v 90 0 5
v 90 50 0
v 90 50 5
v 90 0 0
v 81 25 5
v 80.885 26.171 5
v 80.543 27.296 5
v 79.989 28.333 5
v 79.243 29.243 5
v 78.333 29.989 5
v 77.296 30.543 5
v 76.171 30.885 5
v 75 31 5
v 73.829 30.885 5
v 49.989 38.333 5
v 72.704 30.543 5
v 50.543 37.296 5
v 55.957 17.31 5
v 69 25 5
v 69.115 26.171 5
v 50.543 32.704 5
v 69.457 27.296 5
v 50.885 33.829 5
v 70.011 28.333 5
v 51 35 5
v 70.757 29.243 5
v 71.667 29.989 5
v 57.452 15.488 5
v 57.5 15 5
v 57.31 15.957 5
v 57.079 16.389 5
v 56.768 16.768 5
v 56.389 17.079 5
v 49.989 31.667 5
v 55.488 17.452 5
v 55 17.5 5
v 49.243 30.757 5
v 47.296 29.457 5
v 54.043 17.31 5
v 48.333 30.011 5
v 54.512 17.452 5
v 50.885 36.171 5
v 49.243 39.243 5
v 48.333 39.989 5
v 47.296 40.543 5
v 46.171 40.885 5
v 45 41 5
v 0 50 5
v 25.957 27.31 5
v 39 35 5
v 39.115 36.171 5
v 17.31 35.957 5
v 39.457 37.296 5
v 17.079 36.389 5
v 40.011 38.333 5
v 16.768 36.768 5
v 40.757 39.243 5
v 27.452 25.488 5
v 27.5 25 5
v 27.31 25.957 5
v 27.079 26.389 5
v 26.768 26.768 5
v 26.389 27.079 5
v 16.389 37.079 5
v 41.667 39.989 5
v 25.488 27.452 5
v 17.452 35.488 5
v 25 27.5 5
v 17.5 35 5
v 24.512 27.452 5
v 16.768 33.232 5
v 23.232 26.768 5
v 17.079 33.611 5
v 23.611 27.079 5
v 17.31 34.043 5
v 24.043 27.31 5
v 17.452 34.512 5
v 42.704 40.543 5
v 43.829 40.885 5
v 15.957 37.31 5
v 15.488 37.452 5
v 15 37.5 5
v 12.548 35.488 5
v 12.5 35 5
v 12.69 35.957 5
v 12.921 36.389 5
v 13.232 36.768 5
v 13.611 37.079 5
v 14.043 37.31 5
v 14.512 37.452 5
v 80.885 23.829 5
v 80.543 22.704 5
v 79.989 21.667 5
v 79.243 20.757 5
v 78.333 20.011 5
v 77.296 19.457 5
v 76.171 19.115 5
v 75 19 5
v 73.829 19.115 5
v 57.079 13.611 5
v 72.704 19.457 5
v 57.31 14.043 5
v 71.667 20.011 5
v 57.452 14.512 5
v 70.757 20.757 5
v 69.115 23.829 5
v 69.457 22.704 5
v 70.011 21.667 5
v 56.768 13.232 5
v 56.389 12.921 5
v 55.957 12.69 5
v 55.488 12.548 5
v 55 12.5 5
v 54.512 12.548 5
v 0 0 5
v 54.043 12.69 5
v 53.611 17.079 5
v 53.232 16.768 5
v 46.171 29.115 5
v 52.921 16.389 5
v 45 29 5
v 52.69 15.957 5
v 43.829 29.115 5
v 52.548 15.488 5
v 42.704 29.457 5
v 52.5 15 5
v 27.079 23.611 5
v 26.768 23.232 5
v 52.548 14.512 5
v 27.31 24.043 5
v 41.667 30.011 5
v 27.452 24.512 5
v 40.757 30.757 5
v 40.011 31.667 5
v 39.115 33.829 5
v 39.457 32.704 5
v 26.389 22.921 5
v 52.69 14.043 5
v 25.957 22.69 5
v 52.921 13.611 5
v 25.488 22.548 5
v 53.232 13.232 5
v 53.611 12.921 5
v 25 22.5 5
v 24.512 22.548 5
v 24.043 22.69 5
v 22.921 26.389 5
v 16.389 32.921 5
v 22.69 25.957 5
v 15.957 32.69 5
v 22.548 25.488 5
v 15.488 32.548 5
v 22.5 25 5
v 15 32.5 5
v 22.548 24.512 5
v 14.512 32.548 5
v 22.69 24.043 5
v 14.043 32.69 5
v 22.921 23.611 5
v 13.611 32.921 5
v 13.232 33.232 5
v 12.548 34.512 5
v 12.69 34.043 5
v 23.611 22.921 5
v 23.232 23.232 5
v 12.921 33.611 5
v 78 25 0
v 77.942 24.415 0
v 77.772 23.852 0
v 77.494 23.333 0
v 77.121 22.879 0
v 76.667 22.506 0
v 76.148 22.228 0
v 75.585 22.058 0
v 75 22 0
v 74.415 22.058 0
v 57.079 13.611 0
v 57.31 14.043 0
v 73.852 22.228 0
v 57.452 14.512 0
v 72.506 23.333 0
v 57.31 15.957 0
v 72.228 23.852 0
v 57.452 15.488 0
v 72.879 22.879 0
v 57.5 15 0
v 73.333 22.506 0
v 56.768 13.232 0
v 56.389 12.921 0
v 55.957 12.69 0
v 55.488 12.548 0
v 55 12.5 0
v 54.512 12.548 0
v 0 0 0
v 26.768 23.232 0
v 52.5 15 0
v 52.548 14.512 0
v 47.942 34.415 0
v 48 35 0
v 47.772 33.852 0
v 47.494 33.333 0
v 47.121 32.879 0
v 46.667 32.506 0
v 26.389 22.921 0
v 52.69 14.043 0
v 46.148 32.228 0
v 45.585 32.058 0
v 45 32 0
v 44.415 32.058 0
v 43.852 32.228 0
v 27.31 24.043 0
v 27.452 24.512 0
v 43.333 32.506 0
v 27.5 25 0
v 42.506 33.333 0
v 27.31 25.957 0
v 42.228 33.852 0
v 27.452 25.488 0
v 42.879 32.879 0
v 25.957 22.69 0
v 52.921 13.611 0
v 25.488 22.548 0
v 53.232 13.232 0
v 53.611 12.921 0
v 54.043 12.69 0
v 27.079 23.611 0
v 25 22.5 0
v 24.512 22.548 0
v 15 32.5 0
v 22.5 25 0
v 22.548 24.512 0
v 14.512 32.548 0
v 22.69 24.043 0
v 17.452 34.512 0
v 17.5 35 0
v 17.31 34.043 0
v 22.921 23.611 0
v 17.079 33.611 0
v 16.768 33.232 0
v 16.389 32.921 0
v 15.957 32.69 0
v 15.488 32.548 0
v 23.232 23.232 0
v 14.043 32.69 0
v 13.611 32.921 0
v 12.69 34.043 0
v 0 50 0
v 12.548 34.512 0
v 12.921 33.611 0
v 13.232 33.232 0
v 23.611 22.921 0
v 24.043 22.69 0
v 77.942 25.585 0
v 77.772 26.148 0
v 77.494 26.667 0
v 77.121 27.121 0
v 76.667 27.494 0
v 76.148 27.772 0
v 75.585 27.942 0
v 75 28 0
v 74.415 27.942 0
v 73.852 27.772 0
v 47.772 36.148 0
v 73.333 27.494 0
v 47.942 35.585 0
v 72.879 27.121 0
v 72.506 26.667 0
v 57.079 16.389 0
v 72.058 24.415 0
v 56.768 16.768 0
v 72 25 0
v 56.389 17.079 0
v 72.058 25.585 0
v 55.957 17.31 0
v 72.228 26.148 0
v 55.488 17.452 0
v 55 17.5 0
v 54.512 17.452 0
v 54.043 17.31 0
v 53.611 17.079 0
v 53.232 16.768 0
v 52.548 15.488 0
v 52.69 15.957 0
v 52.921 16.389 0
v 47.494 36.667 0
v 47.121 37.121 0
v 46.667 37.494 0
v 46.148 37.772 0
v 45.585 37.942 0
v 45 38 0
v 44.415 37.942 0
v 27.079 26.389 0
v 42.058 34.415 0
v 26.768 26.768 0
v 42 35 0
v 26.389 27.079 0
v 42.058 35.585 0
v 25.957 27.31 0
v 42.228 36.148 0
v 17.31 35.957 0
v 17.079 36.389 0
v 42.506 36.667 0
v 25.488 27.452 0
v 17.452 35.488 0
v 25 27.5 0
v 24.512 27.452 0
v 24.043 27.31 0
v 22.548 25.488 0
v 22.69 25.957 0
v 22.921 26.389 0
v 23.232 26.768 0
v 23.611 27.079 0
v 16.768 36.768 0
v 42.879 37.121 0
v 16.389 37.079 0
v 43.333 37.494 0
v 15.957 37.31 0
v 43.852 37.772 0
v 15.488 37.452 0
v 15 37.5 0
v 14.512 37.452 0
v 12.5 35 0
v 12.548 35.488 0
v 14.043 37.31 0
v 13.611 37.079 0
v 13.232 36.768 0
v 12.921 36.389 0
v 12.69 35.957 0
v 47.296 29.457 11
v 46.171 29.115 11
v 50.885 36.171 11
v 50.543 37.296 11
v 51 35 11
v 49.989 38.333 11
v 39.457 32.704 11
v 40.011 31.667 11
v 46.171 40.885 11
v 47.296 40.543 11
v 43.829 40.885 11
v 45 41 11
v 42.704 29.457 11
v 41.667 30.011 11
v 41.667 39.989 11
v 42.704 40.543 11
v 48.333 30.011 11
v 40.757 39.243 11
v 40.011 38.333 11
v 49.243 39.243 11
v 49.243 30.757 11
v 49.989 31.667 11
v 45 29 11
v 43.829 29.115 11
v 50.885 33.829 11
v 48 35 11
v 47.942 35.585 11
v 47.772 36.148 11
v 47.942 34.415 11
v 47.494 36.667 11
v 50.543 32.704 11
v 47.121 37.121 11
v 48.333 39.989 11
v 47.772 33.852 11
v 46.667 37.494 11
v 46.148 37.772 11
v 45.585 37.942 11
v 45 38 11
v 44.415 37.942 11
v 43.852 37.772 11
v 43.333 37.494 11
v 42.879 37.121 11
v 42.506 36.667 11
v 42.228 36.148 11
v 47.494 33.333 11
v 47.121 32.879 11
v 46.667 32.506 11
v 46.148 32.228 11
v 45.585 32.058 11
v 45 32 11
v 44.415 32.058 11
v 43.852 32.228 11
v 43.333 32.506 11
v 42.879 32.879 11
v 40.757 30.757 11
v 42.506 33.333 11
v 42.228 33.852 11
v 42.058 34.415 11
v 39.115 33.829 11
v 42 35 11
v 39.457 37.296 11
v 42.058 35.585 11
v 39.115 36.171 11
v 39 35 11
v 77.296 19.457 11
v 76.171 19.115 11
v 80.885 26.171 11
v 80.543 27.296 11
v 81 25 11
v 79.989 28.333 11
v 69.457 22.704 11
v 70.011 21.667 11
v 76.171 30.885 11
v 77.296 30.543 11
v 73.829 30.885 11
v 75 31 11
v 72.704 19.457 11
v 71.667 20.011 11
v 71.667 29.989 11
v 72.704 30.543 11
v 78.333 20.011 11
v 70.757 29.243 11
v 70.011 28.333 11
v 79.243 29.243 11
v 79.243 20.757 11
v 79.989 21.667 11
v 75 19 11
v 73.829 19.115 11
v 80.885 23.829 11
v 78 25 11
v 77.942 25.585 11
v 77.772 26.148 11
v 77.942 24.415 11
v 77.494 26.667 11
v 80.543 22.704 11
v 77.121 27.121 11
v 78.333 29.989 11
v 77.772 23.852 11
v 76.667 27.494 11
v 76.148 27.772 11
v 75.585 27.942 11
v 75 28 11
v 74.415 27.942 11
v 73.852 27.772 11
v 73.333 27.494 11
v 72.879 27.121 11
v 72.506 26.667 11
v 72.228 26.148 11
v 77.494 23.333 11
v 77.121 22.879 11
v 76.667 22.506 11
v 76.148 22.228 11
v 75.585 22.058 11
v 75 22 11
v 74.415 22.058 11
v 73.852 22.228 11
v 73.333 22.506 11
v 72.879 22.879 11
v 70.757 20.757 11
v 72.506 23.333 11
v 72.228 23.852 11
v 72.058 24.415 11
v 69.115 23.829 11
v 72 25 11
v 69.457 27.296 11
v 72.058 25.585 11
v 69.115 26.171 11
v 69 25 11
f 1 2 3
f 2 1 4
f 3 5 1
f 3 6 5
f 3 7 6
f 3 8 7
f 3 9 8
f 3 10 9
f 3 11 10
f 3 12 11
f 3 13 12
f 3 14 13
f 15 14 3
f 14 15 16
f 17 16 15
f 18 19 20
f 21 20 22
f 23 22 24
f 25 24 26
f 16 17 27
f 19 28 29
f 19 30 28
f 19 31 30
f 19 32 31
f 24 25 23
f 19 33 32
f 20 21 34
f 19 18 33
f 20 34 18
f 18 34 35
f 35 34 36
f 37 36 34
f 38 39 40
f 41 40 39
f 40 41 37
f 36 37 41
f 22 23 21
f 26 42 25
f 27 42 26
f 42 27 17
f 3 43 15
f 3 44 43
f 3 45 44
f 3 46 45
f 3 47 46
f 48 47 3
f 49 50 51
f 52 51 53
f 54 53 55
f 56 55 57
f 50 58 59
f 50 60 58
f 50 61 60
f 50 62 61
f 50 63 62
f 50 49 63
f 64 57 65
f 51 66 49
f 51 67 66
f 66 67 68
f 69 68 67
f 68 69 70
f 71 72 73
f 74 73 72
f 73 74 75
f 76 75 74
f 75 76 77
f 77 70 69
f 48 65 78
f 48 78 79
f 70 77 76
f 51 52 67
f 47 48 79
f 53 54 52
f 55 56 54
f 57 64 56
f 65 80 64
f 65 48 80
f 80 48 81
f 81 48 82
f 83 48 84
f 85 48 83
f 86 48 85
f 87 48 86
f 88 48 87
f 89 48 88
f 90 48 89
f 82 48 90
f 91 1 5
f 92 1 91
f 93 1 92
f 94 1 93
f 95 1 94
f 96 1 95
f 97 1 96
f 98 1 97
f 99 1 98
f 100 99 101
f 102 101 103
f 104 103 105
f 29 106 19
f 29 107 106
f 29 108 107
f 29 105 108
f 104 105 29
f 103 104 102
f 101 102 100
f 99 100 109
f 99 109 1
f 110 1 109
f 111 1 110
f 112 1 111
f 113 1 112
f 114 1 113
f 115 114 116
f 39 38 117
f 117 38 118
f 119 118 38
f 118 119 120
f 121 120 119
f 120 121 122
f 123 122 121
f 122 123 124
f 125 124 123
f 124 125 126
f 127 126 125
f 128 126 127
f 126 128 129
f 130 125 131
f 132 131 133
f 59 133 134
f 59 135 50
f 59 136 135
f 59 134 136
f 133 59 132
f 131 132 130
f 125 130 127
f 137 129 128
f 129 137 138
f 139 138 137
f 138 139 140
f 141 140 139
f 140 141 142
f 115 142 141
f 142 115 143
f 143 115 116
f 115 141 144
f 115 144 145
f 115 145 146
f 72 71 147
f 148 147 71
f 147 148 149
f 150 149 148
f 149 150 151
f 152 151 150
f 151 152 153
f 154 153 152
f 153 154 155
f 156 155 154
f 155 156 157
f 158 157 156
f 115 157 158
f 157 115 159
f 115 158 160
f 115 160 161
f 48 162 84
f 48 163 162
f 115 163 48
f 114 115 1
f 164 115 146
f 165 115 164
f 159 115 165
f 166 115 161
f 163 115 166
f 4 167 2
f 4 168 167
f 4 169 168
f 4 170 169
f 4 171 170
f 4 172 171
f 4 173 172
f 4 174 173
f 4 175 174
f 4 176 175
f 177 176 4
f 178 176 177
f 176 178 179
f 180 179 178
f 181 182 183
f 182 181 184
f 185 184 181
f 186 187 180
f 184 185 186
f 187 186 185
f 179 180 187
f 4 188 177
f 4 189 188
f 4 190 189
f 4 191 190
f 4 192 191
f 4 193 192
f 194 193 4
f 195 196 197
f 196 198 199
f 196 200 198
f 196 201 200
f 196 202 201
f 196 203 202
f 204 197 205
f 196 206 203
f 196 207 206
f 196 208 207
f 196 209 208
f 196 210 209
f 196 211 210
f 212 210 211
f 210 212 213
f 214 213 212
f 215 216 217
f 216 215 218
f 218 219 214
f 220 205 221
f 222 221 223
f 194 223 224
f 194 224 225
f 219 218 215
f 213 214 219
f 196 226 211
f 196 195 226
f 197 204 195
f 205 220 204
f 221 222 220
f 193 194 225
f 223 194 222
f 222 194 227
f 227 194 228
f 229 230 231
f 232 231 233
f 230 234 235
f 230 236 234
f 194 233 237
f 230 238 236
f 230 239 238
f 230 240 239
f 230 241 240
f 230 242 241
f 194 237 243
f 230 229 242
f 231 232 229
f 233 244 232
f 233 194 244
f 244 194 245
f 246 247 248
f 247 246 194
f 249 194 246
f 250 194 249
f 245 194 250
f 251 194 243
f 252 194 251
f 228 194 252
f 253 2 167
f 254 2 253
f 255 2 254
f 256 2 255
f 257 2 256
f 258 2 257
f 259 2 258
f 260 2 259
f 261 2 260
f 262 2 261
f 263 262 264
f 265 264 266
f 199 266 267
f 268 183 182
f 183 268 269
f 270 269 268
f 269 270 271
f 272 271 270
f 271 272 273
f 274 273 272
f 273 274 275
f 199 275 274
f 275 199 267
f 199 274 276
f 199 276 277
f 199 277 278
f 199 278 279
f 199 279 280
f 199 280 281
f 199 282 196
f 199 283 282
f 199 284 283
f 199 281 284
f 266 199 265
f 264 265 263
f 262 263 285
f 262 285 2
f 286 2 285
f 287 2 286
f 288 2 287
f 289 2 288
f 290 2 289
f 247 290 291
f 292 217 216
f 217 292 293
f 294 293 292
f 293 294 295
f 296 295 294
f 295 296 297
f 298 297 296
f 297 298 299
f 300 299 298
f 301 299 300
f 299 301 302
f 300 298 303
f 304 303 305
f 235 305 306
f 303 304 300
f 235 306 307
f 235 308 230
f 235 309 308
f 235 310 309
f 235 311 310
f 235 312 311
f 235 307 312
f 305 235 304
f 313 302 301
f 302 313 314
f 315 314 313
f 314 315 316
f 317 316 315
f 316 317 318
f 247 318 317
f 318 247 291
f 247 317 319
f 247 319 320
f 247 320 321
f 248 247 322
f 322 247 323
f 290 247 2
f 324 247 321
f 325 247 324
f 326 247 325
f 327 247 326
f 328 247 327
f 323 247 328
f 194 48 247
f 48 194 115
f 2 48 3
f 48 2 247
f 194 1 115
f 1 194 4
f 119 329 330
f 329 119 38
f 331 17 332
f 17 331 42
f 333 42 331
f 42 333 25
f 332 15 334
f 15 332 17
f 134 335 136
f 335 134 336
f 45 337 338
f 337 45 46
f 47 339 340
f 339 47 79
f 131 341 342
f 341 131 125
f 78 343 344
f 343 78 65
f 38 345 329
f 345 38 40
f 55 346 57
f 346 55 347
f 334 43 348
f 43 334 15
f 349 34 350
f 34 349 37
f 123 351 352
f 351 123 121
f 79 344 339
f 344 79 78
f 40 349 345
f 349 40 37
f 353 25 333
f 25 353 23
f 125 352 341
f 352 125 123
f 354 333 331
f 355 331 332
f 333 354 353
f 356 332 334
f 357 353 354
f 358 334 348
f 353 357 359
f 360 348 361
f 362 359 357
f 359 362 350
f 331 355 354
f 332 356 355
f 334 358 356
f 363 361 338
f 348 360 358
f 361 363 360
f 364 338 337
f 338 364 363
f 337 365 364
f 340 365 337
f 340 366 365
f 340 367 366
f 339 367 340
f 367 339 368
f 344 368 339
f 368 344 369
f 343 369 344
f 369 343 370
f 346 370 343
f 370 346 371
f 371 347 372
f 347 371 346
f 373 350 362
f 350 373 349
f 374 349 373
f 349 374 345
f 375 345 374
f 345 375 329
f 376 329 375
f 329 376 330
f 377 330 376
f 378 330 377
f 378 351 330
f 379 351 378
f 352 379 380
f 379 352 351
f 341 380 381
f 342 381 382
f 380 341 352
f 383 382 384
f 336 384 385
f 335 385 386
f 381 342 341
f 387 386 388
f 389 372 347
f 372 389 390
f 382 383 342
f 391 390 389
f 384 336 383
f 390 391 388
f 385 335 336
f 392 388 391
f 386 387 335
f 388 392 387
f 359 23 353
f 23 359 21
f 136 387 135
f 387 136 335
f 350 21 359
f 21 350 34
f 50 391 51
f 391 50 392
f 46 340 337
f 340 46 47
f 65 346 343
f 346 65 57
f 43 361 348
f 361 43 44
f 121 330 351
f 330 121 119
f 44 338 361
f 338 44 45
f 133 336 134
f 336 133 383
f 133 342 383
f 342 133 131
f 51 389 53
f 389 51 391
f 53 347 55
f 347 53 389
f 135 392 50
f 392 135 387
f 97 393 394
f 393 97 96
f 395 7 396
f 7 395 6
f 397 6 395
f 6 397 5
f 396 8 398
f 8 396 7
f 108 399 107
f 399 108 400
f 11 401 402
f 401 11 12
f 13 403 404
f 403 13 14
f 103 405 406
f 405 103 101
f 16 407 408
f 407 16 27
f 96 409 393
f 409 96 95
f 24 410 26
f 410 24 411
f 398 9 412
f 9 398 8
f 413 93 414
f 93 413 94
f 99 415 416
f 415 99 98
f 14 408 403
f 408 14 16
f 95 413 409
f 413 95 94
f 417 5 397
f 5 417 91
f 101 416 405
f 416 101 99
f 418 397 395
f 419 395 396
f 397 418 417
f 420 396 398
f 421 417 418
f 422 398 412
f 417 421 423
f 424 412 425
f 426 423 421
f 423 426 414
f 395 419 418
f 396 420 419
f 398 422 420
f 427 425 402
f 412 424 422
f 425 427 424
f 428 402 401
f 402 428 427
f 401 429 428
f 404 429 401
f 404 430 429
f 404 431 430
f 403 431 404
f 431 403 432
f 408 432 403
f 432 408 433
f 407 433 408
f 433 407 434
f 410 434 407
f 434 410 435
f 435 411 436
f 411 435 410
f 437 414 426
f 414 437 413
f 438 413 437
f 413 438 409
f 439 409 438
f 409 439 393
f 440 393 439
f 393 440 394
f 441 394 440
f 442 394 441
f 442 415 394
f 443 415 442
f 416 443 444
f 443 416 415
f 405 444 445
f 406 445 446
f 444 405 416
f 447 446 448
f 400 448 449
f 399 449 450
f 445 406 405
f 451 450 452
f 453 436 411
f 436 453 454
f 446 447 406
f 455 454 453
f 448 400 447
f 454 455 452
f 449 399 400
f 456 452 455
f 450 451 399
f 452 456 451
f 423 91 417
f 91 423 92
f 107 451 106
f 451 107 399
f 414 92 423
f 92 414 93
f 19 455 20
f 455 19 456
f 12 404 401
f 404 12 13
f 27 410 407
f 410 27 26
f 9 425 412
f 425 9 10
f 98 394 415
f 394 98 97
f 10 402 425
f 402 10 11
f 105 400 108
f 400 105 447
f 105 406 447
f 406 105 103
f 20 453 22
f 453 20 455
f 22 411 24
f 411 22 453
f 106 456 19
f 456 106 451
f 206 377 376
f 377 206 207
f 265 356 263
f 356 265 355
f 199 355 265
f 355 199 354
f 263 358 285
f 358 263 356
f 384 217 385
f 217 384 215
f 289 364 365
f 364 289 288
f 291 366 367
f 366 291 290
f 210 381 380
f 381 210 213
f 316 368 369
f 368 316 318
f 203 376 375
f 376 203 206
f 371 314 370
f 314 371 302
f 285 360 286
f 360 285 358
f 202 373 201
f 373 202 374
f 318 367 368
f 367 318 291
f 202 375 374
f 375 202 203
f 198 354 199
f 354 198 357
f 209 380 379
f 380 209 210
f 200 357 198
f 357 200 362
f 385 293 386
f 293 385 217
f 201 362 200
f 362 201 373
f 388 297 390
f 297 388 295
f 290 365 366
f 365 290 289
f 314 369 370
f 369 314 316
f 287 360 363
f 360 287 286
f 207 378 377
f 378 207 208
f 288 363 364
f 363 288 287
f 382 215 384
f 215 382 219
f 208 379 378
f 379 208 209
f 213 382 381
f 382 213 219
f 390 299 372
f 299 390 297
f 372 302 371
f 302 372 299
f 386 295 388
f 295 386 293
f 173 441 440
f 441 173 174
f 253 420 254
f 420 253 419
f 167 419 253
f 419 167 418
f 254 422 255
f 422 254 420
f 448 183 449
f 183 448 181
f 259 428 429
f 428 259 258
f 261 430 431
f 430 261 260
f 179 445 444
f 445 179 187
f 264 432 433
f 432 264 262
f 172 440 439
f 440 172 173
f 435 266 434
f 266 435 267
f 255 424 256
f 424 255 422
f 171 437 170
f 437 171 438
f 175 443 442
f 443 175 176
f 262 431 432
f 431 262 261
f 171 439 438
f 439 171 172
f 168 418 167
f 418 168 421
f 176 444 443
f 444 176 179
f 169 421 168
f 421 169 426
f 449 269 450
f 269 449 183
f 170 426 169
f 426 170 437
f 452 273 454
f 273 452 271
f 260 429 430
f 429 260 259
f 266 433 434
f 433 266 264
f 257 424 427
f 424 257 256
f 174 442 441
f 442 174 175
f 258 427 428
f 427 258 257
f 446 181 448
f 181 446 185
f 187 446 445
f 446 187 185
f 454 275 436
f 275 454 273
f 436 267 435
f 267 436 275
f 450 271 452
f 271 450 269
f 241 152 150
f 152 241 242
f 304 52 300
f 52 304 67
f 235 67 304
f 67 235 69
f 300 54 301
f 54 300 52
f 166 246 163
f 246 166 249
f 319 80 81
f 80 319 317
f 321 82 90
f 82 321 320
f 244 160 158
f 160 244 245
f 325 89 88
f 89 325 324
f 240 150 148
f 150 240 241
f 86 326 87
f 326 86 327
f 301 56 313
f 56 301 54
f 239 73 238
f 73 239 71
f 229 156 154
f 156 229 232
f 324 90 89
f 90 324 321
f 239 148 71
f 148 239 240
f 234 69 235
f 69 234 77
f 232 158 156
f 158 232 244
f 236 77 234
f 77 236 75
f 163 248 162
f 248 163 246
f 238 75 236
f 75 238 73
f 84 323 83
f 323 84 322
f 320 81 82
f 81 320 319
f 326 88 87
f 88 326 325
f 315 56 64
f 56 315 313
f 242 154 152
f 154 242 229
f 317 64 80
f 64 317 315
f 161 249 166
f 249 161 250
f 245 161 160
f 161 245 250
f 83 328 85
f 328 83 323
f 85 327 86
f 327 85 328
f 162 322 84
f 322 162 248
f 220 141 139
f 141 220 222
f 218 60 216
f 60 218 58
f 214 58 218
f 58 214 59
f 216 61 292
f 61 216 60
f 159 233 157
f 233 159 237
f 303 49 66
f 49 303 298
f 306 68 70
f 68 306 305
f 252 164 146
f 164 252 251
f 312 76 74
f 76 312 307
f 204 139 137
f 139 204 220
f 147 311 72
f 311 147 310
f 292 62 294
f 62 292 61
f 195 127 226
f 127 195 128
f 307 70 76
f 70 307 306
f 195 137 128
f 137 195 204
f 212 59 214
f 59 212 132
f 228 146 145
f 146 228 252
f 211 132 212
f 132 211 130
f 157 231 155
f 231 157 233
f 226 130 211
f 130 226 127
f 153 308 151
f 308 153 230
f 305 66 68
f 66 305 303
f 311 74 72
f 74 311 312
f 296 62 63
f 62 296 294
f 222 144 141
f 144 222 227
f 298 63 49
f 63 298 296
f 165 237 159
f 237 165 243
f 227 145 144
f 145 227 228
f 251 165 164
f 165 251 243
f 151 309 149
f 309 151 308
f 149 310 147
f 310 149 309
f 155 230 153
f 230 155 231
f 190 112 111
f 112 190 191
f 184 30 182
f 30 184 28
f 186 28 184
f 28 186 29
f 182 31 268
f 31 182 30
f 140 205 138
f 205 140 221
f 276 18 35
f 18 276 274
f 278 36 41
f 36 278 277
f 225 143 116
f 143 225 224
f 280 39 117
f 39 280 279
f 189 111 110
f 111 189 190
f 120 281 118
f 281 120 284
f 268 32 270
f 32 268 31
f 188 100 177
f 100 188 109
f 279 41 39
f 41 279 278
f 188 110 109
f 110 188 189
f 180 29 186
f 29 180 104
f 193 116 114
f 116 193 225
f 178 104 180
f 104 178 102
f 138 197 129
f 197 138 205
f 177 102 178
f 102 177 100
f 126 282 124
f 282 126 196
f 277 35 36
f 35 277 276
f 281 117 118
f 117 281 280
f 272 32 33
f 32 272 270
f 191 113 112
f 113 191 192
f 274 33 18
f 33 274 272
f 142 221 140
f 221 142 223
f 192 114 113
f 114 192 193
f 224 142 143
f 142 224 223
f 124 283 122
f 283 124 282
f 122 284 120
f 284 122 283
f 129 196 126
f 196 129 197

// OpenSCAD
$fn = 32;

// ----------------------------------------------------------------------
// Mixed field: bosses and holes at given coordinates
// ----------------------------------------------------------------------

// --- parameters (mm) ---
plate_l = 90;             // plate length, X
plate_w = 50;             // plate width, Y
plate_t = 5;              // plate thickness, Z
boss_d = 12;              // boss diameter
boss_h = 6;               // boss height above the plate
hole_d = 5;               // through hole diameter
fit_tol = 0.1;            // tolerance for press fits, mm
free_tol = 0.5;           // tolerance for clearance fits, mm

total_h = plate_t + boss_h;  // overall height

difference() {
  union() {
    cube([plate_l, plate_w, plate_t]);
    translate([45, 35, plate_t]) cylinder(h = boss_h, d = boss_d);
    translate([75, 25, plate_t]) cylinder(h = boss_h, d = boss_d);
  }
  translate([45, 35, -1]) cylinder(h = total_h + 2, d = boss_d / 2);
  translate([75, 25, -1]) cylinder(h = total_h + 2, d = boss_d / 2);
  translate([15, 35, -1]) cylinder(h = plate_t + 2, d = hole_d);
  translate([25, 25, -1]) cylinder(h = plate_t + 2, d = hole_d);
  translate([55, 15, -1]) cylinder(h = plate_t + 2, d = hole_d);
}
